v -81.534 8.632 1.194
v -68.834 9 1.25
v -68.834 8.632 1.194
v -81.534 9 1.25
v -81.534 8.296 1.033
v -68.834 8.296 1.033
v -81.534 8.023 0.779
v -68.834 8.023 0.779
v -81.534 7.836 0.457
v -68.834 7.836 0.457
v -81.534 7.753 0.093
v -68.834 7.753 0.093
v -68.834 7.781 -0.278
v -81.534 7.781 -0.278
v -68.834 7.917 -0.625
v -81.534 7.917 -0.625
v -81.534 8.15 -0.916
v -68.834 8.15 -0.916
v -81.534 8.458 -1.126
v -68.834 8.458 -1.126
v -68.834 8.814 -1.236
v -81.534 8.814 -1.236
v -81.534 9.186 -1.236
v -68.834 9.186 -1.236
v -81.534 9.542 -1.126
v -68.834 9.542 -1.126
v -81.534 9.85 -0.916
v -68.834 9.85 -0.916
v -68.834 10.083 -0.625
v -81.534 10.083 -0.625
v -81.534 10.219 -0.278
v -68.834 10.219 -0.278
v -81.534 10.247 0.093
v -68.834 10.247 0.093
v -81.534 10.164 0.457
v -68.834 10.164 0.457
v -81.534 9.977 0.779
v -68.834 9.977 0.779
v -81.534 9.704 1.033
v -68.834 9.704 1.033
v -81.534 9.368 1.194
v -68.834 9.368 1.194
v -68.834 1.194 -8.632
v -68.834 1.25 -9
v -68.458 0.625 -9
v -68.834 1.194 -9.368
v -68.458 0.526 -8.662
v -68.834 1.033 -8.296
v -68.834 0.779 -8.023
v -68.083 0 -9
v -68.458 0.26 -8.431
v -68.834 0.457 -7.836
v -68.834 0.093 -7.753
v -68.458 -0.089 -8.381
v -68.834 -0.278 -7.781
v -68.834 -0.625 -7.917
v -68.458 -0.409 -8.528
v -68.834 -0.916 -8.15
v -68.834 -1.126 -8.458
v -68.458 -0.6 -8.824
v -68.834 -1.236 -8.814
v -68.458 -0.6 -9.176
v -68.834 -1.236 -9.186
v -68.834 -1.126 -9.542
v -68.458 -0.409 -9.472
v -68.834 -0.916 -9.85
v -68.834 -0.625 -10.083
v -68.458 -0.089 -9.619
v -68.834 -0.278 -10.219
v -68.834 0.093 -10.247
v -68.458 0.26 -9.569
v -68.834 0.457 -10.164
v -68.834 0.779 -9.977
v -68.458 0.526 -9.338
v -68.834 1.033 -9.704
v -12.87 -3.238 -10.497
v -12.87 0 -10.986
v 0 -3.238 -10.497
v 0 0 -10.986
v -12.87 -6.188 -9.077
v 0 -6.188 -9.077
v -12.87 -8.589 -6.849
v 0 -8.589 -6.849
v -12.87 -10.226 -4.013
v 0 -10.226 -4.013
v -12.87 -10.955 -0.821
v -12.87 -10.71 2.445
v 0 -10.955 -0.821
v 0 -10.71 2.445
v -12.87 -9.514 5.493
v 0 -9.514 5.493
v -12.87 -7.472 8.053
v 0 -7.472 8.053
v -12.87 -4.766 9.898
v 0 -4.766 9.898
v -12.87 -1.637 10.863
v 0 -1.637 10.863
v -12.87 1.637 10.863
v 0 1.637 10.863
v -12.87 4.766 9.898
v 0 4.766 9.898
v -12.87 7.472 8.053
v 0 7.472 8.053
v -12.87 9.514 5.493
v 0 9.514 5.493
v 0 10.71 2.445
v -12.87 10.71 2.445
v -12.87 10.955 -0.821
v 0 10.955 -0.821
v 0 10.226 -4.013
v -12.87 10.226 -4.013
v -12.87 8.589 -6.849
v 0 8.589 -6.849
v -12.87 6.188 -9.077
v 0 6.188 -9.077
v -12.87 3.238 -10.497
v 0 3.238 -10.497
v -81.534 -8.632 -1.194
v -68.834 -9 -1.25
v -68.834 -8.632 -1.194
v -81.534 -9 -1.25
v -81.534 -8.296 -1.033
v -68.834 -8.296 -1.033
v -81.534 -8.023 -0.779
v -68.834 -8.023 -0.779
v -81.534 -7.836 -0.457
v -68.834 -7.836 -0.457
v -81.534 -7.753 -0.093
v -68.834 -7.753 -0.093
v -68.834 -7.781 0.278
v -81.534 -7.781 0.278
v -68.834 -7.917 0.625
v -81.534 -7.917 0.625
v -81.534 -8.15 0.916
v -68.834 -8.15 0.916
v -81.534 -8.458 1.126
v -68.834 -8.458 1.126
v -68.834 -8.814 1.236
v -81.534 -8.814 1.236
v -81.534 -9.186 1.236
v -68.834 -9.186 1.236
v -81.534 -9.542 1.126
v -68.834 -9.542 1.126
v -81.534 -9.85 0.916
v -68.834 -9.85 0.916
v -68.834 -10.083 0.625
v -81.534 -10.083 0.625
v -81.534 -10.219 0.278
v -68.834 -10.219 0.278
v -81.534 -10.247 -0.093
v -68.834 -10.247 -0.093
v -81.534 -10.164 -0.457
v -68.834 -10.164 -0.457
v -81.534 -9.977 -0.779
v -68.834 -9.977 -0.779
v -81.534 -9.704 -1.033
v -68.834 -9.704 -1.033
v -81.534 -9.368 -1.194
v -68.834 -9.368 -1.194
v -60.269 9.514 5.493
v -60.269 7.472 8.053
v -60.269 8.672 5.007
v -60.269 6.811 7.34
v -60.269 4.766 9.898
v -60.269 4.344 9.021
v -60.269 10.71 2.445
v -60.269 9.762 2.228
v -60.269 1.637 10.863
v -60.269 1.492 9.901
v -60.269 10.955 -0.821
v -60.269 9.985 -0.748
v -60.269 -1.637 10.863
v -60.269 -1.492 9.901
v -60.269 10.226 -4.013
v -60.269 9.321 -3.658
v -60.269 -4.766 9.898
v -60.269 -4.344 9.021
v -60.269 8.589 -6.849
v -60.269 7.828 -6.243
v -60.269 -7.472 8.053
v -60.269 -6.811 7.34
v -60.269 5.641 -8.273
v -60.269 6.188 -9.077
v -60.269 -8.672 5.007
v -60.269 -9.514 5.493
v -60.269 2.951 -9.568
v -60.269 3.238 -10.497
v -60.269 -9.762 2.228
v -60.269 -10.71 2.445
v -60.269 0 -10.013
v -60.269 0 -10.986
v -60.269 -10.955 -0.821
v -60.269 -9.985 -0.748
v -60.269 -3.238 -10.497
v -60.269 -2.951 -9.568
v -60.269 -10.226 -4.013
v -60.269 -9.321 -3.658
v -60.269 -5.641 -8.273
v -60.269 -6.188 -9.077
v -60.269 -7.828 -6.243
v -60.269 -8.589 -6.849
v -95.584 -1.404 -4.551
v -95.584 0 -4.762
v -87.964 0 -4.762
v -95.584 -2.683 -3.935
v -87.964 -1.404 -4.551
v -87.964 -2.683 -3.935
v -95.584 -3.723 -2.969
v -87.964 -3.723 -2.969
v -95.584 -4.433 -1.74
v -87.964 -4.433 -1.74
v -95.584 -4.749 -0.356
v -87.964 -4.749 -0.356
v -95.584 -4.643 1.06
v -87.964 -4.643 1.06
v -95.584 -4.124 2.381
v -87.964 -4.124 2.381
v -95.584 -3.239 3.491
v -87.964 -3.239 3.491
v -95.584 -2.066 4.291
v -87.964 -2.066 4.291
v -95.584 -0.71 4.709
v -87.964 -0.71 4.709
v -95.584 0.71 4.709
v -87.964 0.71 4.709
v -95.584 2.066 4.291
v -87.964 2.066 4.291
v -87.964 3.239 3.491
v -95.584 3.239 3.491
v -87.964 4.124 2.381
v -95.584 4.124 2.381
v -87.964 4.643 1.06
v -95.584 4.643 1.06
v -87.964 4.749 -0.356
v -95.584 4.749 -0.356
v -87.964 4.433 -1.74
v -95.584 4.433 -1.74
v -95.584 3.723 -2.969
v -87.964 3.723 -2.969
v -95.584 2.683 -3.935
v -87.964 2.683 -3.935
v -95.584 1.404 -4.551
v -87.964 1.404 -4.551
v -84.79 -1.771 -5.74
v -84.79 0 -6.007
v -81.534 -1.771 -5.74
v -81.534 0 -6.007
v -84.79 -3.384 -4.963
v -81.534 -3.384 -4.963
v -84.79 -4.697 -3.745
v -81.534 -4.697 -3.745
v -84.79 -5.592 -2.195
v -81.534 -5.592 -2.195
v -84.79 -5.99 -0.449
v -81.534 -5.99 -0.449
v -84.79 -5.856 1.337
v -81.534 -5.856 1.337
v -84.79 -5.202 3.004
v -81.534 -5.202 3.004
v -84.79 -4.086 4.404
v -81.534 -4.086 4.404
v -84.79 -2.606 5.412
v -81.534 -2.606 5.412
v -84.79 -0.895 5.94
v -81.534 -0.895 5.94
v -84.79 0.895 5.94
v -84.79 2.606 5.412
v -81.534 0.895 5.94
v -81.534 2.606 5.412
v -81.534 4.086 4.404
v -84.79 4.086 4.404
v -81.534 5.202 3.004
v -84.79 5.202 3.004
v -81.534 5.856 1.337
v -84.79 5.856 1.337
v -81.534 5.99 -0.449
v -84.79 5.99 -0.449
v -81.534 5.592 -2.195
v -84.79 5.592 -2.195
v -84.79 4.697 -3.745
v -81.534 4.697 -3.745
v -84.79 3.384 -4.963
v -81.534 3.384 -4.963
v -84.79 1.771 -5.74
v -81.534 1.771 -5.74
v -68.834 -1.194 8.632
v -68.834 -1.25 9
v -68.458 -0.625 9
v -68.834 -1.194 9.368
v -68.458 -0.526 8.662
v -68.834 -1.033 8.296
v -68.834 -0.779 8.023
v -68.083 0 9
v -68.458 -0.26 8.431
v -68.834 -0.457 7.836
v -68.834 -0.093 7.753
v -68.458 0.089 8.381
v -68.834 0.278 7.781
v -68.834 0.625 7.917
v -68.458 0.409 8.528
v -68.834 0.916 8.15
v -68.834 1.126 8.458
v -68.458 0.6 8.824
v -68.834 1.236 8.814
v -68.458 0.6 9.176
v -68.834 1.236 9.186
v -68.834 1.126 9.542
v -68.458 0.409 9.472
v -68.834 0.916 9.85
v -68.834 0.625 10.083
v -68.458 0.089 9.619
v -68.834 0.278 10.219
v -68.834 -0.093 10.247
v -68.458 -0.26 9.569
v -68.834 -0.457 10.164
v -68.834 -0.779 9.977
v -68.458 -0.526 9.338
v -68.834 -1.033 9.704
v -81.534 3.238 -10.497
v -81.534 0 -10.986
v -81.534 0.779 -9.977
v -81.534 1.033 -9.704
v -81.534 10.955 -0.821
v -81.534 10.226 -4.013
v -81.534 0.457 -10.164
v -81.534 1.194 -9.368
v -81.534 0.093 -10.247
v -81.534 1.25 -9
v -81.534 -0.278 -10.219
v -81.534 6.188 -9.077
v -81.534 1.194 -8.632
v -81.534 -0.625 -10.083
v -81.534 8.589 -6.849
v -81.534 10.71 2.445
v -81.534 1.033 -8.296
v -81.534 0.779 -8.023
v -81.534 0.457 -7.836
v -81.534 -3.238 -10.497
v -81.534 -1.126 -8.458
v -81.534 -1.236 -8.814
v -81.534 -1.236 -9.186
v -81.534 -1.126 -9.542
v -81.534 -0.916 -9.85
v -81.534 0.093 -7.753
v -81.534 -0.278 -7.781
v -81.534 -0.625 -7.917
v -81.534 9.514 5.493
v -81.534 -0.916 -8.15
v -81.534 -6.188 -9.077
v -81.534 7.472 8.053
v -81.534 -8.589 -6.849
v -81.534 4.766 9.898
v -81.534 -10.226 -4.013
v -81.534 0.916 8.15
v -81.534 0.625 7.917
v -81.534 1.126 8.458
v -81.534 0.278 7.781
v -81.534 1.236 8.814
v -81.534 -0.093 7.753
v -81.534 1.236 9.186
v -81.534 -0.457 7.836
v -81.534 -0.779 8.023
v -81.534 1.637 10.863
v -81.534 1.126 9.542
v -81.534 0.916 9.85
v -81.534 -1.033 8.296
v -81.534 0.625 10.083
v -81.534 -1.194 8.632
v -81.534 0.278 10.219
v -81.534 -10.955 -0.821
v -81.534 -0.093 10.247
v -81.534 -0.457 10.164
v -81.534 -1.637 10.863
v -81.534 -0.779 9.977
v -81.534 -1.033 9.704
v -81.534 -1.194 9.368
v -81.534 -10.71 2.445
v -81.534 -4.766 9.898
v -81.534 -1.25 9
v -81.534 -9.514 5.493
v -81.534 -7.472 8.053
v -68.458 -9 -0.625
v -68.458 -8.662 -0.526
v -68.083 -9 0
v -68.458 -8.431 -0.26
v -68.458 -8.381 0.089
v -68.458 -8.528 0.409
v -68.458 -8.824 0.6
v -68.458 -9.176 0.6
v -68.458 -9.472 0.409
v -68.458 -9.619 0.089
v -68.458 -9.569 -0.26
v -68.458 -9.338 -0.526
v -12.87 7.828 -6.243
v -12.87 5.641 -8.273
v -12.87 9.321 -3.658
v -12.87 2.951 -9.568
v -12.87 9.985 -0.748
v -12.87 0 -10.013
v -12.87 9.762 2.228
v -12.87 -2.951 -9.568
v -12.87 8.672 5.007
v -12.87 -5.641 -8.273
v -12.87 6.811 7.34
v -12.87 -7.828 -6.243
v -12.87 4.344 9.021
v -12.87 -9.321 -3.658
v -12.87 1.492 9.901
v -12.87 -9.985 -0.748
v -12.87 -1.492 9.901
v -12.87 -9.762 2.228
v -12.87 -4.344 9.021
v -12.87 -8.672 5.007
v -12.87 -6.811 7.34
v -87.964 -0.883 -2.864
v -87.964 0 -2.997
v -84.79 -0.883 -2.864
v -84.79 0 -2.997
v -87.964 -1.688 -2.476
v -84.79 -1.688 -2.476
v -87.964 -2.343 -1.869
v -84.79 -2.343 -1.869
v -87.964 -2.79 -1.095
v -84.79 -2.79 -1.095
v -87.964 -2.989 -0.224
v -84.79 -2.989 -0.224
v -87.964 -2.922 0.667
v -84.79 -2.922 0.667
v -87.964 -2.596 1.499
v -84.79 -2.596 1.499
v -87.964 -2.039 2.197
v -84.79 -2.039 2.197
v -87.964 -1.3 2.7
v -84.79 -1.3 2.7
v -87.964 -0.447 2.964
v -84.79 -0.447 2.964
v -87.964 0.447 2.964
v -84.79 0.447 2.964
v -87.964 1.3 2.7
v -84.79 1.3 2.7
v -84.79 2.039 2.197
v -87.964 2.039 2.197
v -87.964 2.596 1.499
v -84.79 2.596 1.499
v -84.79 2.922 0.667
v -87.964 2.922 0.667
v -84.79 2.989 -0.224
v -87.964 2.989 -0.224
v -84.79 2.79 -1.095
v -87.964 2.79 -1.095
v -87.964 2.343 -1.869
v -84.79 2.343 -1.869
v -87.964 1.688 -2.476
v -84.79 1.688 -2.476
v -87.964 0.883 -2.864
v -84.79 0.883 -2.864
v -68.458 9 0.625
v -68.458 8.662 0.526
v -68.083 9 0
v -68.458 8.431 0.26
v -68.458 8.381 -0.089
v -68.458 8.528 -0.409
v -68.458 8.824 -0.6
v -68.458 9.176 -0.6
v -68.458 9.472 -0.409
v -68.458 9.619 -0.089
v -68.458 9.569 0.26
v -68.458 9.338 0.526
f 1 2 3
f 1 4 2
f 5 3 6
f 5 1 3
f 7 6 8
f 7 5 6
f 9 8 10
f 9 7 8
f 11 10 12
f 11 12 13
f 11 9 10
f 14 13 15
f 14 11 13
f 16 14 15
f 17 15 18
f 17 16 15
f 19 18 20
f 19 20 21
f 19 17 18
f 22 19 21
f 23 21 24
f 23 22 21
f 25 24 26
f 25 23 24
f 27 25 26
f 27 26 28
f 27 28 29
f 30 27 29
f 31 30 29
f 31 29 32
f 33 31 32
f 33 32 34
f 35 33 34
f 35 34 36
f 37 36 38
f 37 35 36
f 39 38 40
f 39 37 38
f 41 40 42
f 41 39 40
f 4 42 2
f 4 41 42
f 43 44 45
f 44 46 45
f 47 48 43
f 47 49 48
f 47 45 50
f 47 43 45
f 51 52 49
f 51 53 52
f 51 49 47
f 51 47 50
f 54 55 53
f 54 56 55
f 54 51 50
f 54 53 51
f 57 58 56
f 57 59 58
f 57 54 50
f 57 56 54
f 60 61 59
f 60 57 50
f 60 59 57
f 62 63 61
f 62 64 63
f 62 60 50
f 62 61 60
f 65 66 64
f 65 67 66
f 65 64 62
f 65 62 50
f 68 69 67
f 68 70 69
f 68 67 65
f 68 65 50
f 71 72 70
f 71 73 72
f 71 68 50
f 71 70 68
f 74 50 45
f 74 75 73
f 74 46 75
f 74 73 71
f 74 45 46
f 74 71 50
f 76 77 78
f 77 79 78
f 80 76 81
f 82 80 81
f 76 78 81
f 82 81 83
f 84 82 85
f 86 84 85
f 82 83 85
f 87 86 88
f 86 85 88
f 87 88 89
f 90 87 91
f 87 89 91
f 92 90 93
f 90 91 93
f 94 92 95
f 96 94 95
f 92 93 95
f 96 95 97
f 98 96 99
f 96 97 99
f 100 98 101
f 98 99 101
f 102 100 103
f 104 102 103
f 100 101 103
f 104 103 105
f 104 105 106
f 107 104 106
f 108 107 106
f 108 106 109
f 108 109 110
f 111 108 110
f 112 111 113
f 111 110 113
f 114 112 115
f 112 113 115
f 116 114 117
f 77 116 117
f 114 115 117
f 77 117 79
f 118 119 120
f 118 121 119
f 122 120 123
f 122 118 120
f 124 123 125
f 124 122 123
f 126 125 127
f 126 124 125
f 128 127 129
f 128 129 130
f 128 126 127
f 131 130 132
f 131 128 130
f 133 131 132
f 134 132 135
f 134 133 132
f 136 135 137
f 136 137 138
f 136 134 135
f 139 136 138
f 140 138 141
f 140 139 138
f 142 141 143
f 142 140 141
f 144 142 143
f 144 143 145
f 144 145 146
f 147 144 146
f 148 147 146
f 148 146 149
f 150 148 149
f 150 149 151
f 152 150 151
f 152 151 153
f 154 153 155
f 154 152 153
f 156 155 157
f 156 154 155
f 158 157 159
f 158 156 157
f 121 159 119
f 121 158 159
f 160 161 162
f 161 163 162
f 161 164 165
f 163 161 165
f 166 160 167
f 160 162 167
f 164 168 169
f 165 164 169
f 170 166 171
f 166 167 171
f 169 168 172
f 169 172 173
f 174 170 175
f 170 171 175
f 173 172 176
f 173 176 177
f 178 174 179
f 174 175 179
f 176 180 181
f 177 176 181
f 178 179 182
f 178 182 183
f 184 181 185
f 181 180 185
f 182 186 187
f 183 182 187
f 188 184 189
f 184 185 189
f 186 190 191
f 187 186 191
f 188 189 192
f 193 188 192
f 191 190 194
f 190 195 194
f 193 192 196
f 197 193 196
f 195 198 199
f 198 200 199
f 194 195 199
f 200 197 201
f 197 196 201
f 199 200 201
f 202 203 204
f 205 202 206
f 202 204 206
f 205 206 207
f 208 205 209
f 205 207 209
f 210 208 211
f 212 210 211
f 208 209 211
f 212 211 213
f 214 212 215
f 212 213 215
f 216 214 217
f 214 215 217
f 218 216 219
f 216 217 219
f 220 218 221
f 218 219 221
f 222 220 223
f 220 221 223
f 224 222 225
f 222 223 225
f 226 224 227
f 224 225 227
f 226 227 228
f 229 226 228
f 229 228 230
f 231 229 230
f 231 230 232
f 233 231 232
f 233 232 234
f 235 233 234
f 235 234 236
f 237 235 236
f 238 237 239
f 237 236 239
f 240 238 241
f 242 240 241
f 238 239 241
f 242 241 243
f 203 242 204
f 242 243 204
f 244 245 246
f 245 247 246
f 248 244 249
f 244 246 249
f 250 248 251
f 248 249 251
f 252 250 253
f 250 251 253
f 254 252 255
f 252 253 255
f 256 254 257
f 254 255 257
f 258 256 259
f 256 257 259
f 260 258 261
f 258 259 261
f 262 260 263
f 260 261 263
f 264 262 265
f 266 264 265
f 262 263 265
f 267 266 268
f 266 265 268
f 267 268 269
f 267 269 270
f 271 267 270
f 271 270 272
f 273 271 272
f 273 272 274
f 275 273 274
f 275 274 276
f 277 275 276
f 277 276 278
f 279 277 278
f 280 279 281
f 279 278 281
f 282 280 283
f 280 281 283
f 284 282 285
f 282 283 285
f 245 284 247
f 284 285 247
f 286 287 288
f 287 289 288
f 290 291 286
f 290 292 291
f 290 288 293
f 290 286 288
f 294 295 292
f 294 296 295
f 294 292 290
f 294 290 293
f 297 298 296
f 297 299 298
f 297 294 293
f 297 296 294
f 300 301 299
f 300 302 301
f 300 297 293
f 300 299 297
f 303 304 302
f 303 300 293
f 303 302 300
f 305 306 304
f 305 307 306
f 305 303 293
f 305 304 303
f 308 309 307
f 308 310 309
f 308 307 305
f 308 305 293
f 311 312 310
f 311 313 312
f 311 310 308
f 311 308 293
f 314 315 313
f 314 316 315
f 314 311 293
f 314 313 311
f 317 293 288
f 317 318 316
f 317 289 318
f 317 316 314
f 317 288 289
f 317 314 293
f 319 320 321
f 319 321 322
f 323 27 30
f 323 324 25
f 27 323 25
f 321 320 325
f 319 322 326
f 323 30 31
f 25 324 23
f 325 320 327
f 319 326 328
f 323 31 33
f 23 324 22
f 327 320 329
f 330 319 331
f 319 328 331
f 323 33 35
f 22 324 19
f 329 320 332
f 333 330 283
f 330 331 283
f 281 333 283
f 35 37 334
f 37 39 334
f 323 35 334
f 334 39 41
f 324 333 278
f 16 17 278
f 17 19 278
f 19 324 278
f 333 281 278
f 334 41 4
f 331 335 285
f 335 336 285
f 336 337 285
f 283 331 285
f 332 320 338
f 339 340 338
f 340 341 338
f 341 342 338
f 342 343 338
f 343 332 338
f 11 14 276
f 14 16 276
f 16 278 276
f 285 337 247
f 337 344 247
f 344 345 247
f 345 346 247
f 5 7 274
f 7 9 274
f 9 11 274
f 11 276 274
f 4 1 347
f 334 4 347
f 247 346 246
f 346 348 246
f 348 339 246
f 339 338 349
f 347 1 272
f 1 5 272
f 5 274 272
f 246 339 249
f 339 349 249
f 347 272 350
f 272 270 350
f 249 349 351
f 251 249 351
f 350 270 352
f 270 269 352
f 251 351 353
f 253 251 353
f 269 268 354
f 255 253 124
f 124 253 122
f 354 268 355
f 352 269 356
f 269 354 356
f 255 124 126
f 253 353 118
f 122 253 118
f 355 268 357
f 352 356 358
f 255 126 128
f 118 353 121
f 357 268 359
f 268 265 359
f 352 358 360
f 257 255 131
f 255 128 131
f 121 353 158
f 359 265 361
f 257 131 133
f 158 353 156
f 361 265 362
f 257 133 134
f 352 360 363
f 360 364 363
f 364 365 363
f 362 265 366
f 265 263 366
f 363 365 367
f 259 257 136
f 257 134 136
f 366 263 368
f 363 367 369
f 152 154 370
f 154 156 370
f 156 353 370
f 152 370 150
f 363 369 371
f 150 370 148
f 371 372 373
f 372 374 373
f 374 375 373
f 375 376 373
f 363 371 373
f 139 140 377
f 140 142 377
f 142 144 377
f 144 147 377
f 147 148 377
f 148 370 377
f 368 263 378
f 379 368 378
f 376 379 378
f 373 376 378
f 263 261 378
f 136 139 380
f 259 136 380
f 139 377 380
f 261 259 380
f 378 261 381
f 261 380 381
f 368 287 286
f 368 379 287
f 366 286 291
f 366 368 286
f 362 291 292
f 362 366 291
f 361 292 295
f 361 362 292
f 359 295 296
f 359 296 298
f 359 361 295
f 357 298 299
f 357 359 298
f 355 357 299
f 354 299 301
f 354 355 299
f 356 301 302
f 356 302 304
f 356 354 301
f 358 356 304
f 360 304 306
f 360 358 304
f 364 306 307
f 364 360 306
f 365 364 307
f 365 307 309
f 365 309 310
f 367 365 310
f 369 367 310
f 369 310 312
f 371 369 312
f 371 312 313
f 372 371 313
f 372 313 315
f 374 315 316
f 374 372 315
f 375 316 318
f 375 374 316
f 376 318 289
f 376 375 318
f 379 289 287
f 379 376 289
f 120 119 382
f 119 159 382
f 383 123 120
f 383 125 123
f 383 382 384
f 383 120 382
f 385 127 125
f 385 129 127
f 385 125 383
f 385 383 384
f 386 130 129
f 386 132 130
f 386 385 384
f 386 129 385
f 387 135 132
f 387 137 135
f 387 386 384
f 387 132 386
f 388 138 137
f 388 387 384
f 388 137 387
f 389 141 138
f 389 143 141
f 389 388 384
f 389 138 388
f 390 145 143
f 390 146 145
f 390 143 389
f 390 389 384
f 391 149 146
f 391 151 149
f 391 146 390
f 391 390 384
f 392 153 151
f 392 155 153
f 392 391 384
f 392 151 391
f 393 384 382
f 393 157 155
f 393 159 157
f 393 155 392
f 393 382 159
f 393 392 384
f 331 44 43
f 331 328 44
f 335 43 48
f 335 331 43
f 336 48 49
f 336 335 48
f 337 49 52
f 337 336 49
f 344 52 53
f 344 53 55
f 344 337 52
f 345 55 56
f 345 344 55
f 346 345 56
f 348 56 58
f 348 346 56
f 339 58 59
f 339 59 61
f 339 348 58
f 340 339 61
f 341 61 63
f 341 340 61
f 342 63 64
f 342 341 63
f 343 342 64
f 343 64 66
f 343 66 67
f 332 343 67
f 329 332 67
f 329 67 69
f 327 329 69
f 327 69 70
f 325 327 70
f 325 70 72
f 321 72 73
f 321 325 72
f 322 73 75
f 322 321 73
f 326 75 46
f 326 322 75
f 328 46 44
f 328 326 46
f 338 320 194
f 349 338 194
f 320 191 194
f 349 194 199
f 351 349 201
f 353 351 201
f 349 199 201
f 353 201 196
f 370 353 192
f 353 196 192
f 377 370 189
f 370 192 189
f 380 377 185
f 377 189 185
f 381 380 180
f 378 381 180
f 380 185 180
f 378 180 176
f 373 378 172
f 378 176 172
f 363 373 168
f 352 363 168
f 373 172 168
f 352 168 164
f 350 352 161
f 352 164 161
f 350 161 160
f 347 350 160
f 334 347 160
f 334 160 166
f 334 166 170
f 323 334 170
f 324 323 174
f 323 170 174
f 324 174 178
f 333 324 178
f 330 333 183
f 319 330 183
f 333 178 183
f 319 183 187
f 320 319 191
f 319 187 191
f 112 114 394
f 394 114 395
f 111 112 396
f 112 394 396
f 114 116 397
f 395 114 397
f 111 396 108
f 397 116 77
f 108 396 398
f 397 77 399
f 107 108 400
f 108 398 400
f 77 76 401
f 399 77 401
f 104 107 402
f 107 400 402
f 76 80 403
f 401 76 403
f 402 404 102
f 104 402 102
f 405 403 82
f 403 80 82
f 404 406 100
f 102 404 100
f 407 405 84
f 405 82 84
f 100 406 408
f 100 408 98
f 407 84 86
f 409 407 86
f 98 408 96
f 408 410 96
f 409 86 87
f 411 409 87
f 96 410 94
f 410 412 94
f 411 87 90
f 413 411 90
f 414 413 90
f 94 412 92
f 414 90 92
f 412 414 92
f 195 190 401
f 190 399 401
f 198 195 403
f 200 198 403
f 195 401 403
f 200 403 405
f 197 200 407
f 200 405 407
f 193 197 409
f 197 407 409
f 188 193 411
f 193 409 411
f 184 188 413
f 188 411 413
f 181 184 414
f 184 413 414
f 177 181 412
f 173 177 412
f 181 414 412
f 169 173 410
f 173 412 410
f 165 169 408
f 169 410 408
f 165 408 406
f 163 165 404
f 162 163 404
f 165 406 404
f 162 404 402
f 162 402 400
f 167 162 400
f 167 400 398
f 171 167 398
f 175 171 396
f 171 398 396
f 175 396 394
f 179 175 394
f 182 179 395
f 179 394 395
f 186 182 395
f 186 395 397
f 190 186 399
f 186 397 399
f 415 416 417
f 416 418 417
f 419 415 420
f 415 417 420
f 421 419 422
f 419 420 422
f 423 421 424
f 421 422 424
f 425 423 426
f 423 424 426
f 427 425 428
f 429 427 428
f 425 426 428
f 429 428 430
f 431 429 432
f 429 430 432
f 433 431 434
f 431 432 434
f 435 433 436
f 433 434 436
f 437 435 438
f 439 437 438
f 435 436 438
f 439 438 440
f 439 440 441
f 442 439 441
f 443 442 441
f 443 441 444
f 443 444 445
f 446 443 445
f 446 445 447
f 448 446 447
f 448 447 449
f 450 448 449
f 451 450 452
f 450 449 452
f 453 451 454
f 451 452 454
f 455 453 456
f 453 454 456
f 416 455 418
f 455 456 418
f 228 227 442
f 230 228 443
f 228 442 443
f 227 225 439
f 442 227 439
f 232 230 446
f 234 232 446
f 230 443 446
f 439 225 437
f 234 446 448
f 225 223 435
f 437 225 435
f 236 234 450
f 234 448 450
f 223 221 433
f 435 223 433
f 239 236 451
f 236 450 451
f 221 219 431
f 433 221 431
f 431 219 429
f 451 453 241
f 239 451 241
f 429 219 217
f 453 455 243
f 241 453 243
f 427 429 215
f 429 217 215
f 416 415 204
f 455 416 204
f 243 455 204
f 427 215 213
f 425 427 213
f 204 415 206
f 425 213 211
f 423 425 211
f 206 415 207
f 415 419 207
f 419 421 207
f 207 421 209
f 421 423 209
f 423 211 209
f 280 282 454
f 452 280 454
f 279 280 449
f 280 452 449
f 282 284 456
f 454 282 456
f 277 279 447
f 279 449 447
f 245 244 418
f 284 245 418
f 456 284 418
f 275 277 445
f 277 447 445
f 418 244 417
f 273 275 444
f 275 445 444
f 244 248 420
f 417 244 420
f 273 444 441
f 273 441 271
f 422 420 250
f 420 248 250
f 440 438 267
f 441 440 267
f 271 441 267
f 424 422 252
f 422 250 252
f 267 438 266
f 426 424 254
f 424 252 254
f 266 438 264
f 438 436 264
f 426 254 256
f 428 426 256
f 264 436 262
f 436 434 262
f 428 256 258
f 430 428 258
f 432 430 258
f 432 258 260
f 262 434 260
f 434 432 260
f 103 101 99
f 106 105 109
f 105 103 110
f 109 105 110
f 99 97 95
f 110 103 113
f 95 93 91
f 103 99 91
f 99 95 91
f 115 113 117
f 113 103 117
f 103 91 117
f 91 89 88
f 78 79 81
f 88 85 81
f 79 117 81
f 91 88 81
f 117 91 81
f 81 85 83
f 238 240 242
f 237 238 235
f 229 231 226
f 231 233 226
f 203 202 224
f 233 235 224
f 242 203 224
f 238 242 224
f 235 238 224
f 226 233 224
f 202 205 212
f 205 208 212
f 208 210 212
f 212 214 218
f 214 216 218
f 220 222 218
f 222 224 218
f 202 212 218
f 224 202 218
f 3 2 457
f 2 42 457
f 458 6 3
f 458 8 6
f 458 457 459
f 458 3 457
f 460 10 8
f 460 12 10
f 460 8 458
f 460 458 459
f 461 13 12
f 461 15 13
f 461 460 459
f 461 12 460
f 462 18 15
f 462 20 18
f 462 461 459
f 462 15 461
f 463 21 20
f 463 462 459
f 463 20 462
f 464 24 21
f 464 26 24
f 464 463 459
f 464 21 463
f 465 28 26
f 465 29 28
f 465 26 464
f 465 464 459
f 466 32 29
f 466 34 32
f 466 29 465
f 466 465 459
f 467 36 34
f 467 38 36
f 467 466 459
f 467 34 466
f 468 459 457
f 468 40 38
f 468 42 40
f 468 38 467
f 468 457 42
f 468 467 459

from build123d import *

# Parameters (mm, degrees)
CIRPATTERN1_COUNT = 4


with BuildPart() as part:
    # Sketch1 → Revolve1 (revolve)
    with BuildSketch(Plane.XY, mode=Mode.PRIVATE) as revolve1_sk:
        Polygon((-95.584028604, 0), (-95.584028604, 4.7625), (-87.964028604, 4.7625), (-87.964028604, 2.9972), (-84.790088556, 2.9972), (-84.790088556, 6.0071), (-81.534, 6.0071), (-81.534, 10.9855), (-60.269072576, 10.9855), (-60.269072576, 10.013003393), (-12.869596711, 10.013003393), (-12.869596711, 10.9855), (0, 10.9855), (0, 0), align=None)
    revolve(revolve1_sk.sketch.rotate(Axis((0, 0, 0), (-1, 0, 0)), 90), axis=Axis((0, 0, 0), (-1, 0, 0)))

    # Sketch3 → M3x0.5 Tapped Hole1 (revolve, cut)
    with BuildSketch(Plane(origin=(-81.534, 9, 0), x_dir=(0, 0, 1), z_dir=(0, 1, 0))):
        Polygon((0, 0), (0, 13.451075774), (1.25, 12.7), (1.25, 0), align=None)
    m3x0_5_tapped_hole1 = revolve(axis=Axis((-87.884, 9, 0), (1, 0, 0)), mode=Mode.SUBTRACT)

    # CirPattern1: M3x0.5 Tapped Hole1 ×4 about axis
    cirpattern1_axis = Axis((0, 0, 0), (1, 0, 0))
    for i in range(1, CIRPATTERN1_COUNT):
        add(m3x0_5_tapped_hole1.rotate(cirpattern1_axis, i * 360 / CIRPATTERN1_COUNT), mode=Mode.SUBTRACT)


solid = part.part
